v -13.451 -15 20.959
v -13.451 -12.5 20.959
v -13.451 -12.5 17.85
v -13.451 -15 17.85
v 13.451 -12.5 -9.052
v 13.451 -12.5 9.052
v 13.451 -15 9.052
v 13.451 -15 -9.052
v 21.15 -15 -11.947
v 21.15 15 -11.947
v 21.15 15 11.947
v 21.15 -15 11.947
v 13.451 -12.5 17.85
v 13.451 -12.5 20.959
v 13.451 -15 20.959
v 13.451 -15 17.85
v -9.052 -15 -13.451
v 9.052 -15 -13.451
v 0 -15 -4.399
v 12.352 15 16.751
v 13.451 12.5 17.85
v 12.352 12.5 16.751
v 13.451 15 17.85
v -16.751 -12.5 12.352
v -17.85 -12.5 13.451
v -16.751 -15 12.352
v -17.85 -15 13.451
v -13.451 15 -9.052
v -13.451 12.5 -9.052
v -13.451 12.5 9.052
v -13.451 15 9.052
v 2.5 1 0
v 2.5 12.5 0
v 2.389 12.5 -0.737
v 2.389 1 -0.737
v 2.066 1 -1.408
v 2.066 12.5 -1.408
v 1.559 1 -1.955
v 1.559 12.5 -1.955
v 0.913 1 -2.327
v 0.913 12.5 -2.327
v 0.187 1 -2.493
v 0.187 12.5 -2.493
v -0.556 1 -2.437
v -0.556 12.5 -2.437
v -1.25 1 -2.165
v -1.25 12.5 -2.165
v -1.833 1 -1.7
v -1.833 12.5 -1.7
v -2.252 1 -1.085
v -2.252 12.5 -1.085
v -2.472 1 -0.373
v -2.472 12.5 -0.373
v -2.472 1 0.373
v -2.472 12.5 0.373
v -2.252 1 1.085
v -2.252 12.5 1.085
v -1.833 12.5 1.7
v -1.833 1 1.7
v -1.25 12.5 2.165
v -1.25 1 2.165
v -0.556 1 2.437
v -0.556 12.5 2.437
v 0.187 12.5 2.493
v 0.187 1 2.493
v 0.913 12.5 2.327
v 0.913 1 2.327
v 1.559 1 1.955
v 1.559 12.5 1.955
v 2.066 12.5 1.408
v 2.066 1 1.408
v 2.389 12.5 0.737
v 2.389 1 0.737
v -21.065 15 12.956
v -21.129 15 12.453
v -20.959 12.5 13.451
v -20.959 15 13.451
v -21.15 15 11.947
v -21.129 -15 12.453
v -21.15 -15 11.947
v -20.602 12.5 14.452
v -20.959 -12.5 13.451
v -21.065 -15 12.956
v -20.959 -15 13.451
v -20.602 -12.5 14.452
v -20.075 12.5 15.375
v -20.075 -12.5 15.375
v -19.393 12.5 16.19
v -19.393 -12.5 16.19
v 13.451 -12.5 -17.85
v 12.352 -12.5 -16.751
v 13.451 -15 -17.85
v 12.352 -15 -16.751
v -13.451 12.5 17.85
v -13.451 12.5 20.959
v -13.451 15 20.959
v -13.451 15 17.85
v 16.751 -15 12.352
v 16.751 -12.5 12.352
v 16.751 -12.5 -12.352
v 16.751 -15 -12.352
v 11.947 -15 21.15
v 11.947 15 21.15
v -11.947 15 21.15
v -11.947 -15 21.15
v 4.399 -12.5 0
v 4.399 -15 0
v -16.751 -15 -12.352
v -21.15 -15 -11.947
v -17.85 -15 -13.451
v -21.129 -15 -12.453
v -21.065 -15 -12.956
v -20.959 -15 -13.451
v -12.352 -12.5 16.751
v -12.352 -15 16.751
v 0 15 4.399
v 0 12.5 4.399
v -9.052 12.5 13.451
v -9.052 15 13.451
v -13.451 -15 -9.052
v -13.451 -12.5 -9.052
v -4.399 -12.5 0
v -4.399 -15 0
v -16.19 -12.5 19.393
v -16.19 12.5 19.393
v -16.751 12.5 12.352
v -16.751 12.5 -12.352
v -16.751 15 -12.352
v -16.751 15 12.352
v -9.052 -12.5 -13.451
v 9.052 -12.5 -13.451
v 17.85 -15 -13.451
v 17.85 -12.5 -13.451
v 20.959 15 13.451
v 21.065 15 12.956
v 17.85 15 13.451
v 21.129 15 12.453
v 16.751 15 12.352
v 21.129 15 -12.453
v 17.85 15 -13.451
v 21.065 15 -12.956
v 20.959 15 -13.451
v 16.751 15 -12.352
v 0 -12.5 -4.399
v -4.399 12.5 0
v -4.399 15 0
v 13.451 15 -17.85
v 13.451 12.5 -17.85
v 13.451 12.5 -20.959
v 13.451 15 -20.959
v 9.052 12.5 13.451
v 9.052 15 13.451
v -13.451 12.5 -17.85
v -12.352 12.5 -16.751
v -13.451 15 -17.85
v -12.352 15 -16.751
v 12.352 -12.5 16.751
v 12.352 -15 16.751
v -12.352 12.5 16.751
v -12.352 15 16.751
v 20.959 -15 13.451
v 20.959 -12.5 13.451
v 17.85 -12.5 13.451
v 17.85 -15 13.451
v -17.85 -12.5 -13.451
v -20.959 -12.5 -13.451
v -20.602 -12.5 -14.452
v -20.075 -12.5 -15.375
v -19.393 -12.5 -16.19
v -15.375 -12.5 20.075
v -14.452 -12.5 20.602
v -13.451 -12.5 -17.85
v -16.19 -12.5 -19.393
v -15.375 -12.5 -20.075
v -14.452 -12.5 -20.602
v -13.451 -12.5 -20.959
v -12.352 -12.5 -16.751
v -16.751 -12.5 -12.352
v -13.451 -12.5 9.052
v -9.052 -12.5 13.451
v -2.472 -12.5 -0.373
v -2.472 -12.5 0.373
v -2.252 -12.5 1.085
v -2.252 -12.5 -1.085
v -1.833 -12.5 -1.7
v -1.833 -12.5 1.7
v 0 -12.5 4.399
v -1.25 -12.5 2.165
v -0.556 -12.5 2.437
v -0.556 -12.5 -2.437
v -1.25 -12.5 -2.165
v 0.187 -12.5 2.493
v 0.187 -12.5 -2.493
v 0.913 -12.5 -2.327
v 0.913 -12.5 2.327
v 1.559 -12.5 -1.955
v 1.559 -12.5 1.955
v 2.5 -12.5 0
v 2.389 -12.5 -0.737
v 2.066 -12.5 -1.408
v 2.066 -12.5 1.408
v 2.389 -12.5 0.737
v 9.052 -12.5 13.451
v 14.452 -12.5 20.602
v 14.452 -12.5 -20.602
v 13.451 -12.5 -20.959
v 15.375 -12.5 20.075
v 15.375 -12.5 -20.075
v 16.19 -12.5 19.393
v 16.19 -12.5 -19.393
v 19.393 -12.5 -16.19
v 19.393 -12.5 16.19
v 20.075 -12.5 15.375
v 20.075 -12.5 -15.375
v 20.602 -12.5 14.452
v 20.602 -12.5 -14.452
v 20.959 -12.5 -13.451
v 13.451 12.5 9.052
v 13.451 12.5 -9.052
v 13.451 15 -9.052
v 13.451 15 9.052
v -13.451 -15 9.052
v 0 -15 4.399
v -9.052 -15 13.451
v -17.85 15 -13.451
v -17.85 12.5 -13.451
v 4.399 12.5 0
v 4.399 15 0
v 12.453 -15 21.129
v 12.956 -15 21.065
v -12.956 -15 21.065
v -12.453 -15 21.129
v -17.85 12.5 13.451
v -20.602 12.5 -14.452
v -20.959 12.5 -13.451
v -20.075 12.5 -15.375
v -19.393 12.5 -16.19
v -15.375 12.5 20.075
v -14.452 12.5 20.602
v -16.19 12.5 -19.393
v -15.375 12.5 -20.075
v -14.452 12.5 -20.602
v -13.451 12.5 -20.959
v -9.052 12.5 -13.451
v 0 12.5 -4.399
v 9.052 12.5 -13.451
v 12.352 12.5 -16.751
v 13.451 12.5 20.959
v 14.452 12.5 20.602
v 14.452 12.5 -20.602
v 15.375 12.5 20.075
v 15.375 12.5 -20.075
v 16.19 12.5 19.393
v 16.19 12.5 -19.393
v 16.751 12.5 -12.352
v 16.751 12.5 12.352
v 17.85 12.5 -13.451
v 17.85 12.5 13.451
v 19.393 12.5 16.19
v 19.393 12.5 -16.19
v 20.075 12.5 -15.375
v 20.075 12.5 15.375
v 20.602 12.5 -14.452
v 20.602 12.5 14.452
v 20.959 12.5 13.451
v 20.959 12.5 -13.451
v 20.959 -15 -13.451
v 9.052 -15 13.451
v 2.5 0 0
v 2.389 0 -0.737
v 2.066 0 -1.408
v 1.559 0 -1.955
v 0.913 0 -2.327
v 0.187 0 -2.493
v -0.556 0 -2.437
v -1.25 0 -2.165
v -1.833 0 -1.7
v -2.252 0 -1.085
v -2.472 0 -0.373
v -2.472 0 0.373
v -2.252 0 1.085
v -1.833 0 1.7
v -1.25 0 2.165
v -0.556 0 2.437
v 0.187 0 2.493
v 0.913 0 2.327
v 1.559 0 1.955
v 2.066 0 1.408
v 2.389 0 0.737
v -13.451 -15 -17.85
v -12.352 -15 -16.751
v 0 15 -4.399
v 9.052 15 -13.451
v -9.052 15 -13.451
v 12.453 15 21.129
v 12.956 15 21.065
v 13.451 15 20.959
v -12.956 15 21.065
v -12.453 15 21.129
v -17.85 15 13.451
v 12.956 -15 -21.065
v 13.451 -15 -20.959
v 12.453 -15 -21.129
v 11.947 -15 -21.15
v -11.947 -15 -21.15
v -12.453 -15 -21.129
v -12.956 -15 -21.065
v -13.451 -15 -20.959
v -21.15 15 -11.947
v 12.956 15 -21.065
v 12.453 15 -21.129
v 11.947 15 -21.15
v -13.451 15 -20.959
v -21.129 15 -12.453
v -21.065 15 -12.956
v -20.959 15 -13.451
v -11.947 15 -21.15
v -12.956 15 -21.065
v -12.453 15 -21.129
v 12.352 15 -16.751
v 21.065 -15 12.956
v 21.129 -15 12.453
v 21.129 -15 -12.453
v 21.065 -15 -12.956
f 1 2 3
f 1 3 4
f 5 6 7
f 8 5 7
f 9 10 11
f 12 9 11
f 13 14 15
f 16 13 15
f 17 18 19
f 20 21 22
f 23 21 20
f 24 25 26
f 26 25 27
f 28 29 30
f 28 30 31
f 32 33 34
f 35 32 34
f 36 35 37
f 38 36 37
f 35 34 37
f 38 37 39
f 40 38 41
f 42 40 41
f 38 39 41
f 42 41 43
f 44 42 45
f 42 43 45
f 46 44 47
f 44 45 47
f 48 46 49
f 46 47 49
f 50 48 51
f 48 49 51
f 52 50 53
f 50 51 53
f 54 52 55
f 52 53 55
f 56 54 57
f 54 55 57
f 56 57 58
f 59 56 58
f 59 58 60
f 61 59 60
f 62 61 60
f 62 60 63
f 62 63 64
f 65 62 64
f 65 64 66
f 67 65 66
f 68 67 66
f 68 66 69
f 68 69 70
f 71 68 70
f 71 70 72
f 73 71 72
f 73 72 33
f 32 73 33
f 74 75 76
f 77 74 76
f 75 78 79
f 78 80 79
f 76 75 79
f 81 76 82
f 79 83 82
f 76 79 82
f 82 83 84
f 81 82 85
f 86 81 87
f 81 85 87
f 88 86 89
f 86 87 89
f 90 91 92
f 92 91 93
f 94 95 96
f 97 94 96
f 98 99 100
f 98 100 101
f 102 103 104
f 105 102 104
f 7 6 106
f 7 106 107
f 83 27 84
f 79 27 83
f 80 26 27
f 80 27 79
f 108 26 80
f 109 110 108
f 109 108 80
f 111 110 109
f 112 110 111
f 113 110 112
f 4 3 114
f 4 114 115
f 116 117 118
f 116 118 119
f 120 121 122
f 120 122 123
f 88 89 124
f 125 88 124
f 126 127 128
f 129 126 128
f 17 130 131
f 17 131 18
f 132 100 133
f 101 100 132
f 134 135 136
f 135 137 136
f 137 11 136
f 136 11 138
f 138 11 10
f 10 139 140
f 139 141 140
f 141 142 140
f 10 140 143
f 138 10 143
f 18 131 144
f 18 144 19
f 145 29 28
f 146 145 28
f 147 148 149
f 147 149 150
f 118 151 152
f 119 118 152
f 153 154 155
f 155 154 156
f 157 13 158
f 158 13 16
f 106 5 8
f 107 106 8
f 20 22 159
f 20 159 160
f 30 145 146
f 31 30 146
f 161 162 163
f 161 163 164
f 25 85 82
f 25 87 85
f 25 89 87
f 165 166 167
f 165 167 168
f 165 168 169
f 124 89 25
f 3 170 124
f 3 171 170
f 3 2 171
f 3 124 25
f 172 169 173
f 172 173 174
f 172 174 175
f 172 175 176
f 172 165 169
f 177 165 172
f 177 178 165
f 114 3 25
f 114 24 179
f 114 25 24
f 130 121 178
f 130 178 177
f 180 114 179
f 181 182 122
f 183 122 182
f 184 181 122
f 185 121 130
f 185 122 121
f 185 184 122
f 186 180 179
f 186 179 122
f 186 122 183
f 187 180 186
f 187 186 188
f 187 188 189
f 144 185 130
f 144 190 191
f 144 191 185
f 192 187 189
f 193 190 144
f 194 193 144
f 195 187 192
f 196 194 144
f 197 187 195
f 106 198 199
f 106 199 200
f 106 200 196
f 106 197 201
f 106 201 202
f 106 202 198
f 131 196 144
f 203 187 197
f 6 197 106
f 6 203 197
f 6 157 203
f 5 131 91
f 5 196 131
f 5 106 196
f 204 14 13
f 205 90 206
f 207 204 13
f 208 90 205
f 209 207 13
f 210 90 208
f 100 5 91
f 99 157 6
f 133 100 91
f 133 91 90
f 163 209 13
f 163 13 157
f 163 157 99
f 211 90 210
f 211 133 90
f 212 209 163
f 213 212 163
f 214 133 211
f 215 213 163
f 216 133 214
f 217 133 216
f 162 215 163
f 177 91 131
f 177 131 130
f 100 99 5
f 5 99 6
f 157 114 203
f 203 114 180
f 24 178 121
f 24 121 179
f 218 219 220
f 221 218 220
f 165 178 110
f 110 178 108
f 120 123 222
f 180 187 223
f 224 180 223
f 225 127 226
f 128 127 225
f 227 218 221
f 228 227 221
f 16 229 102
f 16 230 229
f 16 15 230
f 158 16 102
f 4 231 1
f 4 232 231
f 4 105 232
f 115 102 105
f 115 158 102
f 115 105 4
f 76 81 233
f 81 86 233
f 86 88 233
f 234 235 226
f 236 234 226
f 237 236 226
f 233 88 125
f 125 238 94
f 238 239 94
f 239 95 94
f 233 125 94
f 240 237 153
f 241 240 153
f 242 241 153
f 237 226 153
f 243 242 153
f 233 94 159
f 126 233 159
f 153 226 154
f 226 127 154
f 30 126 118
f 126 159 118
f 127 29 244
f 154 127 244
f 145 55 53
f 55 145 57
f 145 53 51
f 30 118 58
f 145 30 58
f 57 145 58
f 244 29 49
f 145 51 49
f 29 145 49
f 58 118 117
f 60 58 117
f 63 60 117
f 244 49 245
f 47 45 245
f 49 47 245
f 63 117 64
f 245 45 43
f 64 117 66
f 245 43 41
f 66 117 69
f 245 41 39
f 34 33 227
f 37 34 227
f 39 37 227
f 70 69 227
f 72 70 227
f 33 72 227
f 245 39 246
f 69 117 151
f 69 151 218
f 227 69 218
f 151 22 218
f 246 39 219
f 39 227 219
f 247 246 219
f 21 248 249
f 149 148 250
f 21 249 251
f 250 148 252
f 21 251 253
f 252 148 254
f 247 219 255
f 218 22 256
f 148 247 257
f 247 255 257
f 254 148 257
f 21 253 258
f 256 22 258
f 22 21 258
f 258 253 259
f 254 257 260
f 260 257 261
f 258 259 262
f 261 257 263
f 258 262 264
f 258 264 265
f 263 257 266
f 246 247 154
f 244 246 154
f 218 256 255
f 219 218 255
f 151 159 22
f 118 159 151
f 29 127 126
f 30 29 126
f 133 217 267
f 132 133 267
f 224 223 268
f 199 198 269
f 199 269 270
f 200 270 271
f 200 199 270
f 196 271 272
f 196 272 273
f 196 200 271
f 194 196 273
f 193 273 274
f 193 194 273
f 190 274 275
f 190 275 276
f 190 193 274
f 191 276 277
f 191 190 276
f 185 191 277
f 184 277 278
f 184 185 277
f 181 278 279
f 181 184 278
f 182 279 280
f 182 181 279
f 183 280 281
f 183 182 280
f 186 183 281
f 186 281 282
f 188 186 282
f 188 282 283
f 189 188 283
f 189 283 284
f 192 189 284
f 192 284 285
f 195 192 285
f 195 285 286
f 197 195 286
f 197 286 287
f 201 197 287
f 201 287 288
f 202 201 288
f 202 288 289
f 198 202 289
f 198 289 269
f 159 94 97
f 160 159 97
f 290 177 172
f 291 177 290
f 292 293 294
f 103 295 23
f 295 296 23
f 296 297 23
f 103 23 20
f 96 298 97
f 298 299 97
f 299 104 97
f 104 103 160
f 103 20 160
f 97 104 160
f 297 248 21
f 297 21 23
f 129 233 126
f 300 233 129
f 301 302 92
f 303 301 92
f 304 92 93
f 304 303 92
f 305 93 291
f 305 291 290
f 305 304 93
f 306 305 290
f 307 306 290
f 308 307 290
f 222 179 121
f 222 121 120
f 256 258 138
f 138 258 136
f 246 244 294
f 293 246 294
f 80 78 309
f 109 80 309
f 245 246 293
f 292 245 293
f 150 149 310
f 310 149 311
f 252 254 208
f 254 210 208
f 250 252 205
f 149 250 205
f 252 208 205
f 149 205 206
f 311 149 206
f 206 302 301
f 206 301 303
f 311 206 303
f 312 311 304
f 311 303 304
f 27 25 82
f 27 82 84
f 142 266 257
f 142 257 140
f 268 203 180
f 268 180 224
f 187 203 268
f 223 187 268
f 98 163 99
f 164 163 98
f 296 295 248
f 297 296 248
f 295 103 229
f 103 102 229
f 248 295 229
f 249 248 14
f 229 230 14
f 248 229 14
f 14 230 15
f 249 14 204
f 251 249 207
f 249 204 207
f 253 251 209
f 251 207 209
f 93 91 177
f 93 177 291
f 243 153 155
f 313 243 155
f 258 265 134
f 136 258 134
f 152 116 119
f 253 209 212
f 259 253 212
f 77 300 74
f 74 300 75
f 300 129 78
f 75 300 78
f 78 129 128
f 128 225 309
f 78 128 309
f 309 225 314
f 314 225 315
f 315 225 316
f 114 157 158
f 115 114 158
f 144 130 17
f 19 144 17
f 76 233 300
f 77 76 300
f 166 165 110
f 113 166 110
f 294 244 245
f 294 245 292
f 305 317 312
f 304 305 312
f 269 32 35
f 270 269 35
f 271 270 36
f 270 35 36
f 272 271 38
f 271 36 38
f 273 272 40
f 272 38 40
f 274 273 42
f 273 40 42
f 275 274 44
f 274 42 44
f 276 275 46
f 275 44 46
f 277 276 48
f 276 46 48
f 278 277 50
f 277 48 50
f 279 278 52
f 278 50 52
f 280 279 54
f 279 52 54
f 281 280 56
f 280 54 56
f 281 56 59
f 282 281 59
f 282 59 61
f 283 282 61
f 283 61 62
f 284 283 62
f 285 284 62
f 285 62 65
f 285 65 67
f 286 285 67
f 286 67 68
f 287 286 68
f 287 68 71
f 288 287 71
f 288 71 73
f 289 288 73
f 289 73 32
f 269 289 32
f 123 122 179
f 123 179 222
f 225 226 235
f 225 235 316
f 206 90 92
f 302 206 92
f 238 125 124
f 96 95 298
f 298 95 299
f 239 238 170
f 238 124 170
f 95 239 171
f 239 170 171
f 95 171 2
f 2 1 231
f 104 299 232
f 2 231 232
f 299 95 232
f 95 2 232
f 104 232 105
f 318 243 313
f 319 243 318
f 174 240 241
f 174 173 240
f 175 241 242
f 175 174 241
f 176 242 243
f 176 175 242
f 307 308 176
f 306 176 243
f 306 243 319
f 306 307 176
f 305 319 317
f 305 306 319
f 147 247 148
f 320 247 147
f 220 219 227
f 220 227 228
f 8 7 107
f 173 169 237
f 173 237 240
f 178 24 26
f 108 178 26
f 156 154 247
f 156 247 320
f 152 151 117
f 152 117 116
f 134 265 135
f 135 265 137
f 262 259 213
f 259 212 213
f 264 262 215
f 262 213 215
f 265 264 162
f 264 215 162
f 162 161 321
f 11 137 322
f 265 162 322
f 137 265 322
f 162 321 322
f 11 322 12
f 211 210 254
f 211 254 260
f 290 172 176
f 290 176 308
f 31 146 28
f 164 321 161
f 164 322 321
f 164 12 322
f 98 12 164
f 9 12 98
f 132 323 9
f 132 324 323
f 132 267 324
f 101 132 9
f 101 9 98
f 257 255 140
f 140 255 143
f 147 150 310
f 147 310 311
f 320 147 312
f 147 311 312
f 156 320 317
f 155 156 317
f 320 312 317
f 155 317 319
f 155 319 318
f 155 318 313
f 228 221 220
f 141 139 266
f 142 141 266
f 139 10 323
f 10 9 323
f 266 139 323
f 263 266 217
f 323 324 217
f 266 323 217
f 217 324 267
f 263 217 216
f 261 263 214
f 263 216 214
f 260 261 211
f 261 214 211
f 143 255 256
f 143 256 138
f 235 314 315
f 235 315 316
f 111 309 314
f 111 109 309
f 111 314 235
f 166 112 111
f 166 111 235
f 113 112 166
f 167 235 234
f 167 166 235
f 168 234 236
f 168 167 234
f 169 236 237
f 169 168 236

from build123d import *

# Parameters (mm, degrees)
BOSS_EXTRUDE1_DEPTH = 15
SKETCH18_W          = 3.3
SKETCH18_H          = 2.5
CUT_EXTRUDE10_DEPTH = 43.3
SKETCH19_W          = 3.3
SKETCH19_H          = 2.5
CUT_EXTRUDE11_DEPTH = 43.3
SKETCH20_W          = 6.221233688
SKETCH20_H          = 2.5
CUT_EXTRUDE12_DEPTH = 57.710616844
SKETCH21_W          = 6.221233688
SKETCH21_H          = 2.5
CUT_EXTRUDE13_DEPTH = 57.710616844
SKETCH22_R          = 2.5
CUT_EXTRUDE14_DEPTH = 13.5
CUT_EXTRUDE15_DEPTH = 28.5
FILLET8_R           = 6


with BuildPart() as part:
    # Sketch1 → Boss-Extrude1 (new body)
    with BuildSketch(Plane(origin=(0, 0, 0), x_dir=(1, 0, 0), z_dir=(0, 1, 0))):
        Polygon((-21.15, 16.750923472), (-16.750923472, 21.15), (16.750923472, 21.15), (21.15, 16.750923472), (21.15, -16.750923472), (16.750923472, -21.15), (-16.750923472, -21.15), (-21.15, -16.750923472), align=None)
    boss_extrude1 = extrude(amount=BOSS_EXTRUDE1_DEPTH)

    # Sketch18 → Cut-Extrude10 (cut, through all)
    with BuildSketch(Plane.XY.offset(21.15)):
        with Locations((15.100923472, 13.75)):
            Rectangle(SKETCH18_W, SKETCH18_H)
        with Locations((-15.100923472, 13.75)):
            Rectangle(SKETCH18_W, SKETCH18_H)
    cut_extrude10 = extrude(amount=-CUT_EXTRUDE10_DEPTH, mode=Mode.SUBTRACT)

    # Sketch19 → Cut-Extrude11 (cut, through all)
    with BuildSketch(Plane(origin=(21.15, 0, 0), x_dir=(0, 0, -1), z_dir=(1, 0, 0))):
        with Locations((-15.100923472, 13.75)):
            Rectangle(SKETCH19_W, SKETCH19_H)
        with Locations((15.100923472, 13.75)):
            Rectangle(SKETCH19_W, SKETCH19_H)
    cut_extrude11 = extrude(amount=-CUT_EXTRUDE11_DEPTH, mode=Mode.SUBTRACT)

    # Sketch20 → Cut-Extrude12 (cut, through all)
    with BuildSketch(Plane(origin=(18.950461736, 0, 18.950461736), x_dir=(0.707106781, 0, -0.707106781), z_dir=(0.707106781, 0, 0.707106781))):
        with Locations((0, 13.75)):
            Rectangle(SKETCH20_W, SKETCH20_H)
    cut_extrude12 = extrude(amount=-CUT_EXTRUDE12_DEPTH, mode=Mode.SUBTRACT)

    # Sketch21 → Cut-Extrude13 (cut, through all)
    with BuildSketch(Plane(origin=(-18.950461736, 0, 18.950461736), x_dir=(0.707106781, 0, 0.707106781), z_dir=(-0.707106781, 0, 0.707106781))):
        with Locations((0, 13.75)):
            Rectangle(SKETCH21_W, SKETCH21_H)
    cut_extrude13 = extrude(amount=-CUT_EXTRUDE13_DEPTH, mode=Mode.SUBTRACT)

    # Sketch22 → Cut-Extrude14 (cut, through all)
    with BuildSketch(Plane(origin=(0, 12.5, 0), x_dir=(1, 0, 0), z_dir=(0, 1, 0))):
        Circle(SKETCH22_R)
    cut_extrude14 = extrude(amount=-CUT_EXTRUDE14_DEPTH, mode=Mode.SUBTRACT)

    # Mirror1: Boss-Extrude1, Cut-Extrude10, Cut-Extrude11, Cut-Extrude12, Cut-Extrude13, Cut-Extrude14 across plane
    add(boss_extrude1.mirror(Plane(origin=(0, 0, 0), x_dir=(0, 0, 1), z_dir=(0, -1, 0))))
    add(cut_extrude10.mirror(Plane(origin=(0, 0, 0), x_dir=(0, 0, 1), z_dir=(0, -1, 0))), mode=Mode.SUBTRACT)
    add(cut_extrude11.mirror(Plane(origin=(0, 0, 0), x_dir=(0, 0, 1), z_dir=(0, -1, 0))), mode=Mode.SUBTRACT)
    add(cut_extrude12.mirror(Plane(origin=(0, 0, 0), x_dir=(0, 0, 1), z_dir=(0, -1, 0))), mode=Mode.SUBTRACT)
    add(cut_extrude13.mirror(Plane(origin=(0, 0, 0), x_dir=(0, 0, 1), z_dir=(0, -1, 0))), mode=Mode.SUBTRACT)
    add(cut_extrude14.mirror(Plane(origin=(0, 0, 0), x_dir=(0, 0, 1), z_dir=(0, -1, 0))), mode=Mode.SUBTRACT)

    # Sketch23 → Cut-Extrude15 (cut, through all)
    with BuildSketch(Plane(origin=(0, 12.5, 0), x_dir=(1, 0, 0), z_dir=(0, 1, 0))):
        Polygon((-21.15, -14.432485579), (-14.432485579, -21.15), (-16.750923472, -21.15), (-21.15, -16.750923472), align=None)
        Polygon((-21.15, 14.432485579), (-14.432485579, 21.15), (-16.750923472, 21.15), (-21.15, 16.750923472), align=None)
        Polygon((14.432485579, 21.15), (21.15, 14.432485579), (21.15, 16.750923472), (16.750923472, 21.15), align=None)
        Polygon((14.432485579, -21.15), (21.15, -14.432485579), (21.15, -16.750923472), (16.750923472, -21.15), align=None)
    extrude(amount=-CUT_EXTRUDE15_DEPTH, mode=Mode.SUBTRACT)

    # Fillet8
    fillet8_edges = [part.edges().sort_by_distance(p)[0] for p in [
        (14.432485579, 0, -21.15),
        (21.15, 0, -14.432485579),
        (-21.15, 0, -14.432485579),
        (-14.432485579, 0, -21.15),
        (-14.432485579, 0, 21.15),
        (-21.15, 0, 14.432485579),
        (21.15, 0, 14.432485579),
        (14.432485579, 0, 21.15),
    ]]
    fillet(fillet8_edges, radius=FILLET8_R)


solid = part.part
